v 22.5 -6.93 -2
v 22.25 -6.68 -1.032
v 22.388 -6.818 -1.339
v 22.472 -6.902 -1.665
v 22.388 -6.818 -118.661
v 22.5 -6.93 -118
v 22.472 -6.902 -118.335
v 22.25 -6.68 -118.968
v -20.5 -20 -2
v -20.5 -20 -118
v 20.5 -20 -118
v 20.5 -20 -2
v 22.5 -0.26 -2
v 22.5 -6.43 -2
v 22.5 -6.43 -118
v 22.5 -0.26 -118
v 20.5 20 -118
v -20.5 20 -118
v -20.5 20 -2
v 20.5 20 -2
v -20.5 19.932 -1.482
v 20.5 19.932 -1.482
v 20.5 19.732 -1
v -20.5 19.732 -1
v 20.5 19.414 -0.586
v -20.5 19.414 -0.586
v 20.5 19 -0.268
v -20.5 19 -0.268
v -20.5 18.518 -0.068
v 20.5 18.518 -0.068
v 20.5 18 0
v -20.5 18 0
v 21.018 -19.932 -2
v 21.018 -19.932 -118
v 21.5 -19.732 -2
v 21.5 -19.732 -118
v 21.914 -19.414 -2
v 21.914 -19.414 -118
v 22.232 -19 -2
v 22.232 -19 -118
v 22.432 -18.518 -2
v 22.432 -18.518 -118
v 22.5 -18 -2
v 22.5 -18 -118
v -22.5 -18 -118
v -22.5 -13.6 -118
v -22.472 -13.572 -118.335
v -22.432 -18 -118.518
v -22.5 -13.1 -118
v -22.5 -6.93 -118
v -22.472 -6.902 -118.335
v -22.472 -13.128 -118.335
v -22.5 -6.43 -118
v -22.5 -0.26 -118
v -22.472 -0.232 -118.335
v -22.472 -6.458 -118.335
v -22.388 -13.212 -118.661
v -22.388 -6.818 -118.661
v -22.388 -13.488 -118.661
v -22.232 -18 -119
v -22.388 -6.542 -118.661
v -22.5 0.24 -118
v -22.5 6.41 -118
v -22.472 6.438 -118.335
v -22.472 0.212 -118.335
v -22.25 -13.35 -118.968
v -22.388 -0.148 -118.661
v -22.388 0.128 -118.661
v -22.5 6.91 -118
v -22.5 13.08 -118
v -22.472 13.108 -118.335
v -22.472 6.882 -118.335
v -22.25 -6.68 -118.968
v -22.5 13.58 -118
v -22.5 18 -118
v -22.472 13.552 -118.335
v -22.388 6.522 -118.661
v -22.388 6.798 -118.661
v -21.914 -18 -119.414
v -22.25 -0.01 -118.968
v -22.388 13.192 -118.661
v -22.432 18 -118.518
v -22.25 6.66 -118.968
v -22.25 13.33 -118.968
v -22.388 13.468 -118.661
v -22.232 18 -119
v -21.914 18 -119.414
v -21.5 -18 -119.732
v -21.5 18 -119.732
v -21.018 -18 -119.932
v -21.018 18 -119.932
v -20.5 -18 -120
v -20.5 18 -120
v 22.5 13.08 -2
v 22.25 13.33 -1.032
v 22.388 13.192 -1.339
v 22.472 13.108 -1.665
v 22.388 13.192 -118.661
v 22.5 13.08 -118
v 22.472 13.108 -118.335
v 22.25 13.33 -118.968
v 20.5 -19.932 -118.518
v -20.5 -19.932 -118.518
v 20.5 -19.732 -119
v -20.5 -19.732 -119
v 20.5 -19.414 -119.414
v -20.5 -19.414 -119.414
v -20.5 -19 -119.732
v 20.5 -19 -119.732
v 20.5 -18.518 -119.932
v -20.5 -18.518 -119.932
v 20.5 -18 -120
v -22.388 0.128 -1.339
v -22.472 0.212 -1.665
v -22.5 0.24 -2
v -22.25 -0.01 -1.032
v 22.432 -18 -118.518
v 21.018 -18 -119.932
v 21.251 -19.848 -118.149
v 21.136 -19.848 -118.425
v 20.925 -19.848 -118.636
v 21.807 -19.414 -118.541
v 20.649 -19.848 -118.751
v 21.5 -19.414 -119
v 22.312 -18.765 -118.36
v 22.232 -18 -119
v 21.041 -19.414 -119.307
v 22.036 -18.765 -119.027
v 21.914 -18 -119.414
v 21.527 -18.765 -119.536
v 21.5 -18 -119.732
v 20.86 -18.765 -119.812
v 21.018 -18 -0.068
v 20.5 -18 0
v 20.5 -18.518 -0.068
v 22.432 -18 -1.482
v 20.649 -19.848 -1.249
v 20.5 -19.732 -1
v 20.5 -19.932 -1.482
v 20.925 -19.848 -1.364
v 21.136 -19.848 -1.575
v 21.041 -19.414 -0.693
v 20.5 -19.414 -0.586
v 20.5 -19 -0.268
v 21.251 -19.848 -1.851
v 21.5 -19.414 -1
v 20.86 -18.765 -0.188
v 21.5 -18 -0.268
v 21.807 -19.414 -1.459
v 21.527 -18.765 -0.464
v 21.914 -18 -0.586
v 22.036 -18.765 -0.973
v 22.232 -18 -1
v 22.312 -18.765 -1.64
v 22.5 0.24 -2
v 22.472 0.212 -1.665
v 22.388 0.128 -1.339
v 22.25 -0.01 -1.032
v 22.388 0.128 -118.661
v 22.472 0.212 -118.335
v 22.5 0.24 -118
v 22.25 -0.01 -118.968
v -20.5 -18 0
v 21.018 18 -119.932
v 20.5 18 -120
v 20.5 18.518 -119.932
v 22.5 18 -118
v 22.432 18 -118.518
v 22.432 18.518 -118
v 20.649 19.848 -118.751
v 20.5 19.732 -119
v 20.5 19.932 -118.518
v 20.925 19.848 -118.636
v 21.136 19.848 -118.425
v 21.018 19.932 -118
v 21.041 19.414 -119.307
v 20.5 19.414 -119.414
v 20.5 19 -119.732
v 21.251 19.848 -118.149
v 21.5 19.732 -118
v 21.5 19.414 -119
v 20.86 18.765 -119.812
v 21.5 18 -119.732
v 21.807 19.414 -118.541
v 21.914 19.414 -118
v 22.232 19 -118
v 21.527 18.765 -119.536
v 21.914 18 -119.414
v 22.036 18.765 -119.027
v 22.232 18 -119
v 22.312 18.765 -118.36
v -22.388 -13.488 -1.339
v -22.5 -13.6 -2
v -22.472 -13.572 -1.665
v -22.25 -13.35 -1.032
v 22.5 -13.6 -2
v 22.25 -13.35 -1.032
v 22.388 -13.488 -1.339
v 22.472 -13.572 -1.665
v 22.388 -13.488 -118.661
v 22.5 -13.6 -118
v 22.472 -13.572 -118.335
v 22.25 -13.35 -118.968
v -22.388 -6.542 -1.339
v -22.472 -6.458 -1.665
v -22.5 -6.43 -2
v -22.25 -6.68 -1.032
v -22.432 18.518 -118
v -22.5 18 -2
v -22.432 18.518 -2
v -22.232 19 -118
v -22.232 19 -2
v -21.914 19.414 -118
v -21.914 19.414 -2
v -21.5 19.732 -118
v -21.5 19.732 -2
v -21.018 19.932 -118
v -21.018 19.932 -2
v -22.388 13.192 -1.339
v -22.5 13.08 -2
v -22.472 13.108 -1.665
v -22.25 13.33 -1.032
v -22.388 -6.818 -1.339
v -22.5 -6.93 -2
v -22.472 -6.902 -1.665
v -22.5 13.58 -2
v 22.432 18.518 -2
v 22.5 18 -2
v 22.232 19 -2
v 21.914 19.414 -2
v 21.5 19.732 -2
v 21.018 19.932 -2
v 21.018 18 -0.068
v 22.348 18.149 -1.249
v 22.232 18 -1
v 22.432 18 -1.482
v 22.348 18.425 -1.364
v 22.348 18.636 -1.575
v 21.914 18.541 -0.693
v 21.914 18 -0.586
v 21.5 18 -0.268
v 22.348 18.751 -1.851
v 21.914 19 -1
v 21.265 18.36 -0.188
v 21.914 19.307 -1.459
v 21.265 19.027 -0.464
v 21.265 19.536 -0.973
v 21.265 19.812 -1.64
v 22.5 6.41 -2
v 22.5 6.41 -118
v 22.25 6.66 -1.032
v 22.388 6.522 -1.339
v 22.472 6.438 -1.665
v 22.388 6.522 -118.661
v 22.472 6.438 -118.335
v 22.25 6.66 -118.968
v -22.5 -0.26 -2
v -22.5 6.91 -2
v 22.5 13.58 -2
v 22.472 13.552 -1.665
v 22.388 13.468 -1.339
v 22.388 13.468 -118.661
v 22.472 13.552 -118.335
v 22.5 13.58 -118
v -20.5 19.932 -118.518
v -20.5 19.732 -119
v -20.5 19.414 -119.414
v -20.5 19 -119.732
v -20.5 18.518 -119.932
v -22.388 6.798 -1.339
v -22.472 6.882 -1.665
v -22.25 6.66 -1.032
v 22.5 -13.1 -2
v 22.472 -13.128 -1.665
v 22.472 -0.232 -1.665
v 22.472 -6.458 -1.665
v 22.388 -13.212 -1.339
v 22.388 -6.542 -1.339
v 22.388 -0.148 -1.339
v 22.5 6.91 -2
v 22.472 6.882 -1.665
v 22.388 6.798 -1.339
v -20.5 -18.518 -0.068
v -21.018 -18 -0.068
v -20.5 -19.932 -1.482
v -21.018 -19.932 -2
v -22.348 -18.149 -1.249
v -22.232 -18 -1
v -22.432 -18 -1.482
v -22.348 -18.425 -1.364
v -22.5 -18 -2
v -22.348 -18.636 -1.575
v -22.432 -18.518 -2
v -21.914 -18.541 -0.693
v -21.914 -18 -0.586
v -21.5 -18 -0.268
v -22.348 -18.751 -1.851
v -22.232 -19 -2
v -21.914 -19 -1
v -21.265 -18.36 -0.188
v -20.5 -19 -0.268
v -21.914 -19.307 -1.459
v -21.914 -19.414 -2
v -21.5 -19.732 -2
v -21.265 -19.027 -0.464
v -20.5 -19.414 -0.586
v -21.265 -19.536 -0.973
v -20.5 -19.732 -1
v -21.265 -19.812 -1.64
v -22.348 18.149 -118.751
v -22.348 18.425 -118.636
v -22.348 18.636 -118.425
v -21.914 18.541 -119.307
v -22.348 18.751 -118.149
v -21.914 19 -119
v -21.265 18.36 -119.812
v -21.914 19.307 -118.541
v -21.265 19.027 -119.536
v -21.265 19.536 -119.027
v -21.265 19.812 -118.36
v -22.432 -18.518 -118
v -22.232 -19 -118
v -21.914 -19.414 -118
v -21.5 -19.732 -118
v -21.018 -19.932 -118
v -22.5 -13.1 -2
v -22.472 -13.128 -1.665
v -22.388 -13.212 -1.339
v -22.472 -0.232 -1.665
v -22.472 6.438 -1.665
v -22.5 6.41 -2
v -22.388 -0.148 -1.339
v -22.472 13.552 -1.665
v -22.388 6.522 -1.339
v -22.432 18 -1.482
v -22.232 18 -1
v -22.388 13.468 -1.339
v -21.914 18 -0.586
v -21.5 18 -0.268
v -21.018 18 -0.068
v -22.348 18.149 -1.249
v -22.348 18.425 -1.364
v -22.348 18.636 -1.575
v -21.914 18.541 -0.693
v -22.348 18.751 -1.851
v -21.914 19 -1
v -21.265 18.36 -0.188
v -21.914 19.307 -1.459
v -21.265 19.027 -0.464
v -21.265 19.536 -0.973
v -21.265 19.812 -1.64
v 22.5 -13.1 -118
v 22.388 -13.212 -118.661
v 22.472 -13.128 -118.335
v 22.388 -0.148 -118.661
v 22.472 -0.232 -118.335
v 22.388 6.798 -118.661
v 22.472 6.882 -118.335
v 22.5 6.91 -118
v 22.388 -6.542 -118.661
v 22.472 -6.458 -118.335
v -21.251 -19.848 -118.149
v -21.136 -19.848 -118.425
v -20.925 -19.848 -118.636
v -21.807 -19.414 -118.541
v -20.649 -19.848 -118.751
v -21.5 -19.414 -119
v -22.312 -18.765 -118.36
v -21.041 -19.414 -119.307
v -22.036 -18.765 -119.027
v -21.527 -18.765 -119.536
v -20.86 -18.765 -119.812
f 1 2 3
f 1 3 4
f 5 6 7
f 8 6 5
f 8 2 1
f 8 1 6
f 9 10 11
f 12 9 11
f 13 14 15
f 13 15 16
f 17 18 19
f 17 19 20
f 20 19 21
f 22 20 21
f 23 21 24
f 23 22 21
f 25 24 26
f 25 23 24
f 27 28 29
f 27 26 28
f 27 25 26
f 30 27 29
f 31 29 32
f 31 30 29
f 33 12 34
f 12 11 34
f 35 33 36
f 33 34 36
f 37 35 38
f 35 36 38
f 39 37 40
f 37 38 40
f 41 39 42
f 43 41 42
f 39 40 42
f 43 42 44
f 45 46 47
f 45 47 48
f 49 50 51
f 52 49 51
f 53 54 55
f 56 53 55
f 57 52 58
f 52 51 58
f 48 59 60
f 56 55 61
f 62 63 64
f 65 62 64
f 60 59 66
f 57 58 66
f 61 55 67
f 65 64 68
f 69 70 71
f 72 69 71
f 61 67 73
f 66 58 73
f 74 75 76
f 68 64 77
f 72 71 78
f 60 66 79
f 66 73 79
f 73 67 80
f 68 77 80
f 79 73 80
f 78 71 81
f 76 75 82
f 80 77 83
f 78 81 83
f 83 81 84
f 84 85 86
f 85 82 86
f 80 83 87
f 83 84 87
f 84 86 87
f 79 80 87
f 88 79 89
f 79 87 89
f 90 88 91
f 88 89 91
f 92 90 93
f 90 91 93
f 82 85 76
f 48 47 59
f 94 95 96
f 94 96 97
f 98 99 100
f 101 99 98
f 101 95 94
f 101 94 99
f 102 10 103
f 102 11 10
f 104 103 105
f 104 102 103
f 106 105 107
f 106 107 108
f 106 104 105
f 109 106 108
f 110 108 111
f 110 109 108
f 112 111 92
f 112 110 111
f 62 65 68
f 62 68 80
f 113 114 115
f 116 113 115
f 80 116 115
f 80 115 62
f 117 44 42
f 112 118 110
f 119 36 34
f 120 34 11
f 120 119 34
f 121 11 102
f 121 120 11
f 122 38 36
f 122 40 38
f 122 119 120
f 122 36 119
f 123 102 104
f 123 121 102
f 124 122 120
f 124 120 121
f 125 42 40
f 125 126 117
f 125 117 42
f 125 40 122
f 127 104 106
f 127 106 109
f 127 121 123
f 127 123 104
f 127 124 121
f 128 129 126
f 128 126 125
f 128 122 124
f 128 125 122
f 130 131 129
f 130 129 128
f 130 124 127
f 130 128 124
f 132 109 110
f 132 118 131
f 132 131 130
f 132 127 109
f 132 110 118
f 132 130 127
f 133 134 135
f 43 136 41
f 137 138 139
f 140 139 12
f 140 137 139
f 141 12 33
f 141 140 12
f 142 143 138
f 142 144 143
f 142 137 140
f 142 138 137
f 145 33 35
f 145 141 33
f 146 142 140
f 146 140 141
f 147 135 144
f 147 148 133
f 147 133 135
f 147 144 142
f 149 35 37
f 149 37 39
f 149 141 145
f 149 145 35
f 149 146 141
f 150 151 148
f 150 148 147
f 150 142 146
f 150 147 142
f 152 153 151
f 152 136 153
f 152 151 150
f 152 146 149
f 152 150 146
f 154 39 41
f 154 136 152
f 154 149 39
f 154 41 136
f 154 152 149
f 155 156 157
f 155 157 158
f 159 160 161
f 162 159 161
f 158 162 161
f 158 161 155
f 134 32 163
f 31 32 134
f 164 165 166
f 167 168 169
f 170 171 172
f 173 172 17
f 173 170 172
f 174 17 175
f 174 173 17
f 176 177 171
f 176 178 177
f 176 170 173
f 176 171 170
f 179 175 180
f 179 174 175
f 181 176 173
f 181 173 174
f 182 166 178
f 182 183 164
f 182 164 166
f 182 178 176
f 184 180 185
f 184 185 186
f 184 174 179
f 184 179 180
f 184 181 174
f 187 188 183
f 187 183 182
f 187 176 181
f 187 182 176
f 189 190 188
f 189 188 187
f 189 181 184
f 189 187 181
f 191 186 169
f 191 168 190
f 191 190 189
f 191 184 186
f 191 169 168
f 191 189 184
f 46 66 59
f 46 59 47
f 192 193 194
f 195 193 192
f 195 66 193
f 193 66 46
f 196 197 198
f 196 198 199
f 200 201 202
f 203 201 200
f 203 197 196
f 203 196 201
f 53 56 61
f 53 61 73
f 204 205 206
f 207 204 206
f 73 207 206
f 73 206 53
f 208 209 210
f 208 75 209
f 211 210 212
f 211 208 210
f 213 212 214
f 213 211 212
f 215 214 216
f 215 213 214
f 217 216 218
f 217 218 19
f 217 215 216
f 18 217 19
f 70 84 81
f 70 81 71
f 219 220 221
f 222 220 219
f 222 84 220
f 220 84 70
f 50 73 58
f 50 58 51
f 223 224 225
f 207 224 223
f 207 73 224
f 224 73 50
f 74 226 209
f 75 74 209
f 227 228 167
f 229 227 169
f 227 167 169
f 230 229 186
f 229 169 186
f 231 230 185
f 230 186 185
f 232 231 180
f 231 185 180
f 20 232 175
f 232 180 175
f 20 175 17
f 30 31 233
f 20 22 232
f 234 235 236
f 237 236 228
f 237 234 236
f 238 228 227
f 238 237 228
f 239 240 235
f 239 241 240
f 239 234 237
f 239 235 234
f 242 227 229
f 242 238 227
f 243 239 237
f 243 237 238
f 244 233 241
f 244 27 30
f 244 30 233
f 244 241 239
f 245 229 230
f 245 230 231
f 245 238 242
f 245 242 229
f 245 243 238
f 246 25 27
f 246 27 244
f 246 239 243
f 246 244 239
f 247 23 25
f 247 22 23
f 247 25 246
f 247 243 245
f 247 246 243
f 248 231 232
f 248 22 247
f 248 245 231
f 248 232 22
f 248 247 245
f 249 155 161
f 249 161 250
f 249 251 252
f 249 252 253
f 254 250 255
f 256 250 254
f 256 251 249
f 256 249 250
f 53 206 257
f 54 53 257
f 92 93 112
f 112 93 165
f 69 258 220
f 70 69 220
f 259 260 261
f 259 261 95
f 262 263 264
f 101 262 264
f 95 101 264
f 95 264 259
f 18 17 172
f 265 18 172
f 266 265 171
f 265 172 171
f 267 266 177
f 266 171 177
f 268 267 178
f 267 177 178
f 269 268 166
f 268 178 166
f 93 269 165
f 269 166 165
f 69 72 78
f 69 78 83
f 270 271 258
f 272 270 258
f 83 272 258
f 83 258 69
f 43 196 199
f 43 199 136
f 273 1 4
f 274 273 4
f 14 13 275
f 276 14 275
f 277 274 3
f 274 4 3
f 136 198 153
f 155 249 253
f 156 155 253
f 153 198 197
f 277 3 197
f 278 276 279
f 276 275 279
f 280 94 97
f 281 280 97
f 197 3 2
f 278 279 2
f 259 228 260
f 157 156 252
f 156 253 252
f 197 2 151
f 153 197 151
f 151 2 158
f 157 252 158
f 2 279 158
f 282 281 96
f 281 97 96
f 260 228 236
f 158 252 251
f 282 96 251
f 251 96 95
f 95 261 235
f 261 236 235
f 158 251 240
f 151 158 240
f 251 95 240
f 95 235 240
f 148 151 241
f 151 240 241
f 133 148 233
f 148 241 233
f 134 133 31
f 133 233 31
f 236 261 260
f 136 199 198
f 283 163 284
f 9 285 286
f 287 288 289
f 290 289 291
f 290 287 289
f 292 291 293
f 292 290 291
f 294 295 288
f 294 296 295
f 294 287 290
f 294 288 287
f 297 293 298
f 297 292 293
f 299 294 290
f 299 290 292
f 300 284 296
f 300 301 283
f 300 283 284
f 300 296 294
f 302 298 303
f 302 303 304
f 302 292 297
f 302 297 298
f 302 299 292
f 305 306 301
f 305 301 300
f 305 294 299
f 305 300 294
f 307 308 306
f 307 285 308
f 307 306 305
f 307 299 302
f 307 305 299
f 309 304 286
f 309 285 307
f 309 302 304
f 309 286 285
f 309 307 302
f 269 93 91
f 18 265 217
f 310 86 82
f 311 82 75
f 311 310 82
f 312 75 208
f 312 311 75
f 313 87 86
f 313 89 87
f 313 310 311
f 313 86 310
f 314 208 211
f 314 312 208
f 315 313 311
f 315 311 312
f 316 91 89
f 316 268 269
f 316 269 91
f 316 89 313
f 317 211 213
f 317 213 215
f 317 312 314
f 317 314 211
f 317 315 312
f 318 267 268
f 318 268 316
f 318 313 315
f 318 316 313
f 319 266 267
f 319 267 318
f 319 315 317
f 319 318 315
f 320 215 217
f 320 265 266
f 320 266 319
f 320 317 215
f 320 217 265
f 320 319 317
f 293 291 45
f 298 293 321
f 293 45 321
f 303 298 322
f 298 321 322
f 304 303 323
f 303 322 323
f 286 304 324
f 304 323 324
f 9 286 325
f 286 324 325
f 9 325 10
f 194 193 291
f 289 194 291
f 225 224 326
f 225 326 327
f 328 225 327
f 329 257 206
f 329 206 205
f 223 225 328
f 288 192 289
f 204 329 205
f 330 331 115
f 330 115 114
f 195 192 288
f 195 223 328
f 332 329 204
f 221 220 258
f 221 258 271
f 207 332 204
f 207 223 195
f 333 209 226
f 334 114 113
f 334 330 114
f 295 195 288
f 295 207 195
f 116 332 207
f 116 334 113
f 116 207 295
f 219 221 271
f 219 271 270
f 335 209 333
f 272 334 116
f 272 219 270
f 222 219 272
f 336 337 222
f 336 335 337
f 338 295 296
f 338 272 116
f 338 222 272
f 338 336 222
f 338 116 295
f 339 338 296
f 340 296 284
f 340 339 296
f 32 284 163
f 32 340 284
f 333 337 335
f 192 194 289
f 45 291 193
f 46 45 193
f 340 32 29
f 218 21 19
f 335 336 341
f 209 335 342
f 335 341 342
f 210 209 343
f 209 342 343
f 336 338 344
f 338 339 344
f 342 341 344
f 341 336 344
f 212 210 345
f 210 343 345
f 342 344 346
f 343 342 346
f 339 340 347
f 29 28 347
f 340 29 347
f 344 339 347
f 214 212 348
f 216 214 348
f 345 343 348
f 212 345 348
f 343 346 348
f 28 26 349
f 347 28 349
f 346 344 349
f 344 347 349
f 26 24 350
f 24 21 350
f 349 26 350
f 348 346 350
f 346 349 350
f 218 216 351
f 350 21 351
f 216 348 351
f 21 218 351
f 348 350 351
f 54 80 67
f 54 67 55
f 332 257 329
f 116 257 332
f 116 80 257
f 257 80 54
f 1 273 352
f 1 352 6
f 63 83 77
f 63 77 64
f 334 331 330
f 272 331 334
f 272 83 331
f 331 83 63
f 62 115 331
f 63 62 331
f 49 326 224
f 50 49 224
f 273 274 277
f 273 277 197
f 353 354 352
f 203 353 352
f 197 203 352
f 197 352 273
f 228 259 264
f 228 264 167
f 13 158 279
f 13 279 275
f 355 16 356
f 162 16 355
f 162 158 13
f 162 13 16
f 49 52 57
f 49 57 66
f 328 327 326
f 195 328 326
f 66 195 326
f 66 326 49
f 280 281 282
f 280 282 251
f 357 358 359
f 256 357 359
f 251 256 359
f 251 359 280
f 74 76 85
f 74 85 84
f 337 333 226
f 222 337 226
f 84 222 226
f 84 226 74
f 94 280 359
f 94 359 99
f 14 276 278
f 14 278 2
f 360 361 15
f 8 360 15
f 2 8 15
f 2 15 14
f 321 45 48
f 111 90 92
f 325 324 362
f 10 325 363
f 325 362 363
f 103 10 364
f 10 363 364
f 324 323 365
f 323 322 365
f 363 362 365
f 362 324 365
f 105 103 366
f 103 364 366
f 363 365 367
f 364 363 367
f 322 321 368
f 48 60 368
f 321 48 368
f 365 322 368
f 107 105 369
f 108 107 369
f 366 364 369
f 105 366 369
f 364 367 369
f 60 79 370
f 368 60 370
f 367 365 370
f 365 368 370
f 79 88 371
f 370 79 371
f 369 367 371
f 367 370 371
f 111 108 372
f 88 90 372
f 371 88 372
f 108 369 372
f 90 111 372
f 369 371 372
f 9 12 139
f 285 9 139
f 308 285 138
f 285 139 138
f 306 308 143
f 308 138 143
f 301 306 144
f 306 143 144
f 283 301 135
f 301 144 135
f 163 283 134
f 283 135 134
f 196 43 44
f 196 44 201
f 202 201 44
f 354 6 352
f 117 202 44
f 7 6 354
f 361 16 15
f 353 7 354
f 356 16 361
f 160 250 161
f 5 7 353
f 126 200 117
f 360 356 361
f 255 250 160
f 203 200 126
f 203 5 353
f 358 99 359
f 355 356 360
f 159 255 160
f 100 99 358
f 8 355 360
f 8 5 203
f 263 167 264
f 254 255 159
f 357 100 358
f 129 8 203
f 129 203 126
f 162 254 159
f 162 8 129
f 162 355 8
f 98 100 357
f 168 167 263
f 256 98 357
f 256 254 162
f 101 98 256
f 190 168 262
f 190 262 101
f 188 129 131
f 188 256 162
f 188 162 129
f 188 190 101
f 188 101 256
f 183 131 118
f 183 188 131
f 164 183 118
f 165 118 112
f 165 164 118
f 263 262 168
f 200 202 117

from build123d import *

# Parameters (mm, degrees)
SKETCH1_W           = 45
SKETCH1_H           = 40
BOSS_EXTRUDE1_DEPTH = 120
FILLET1_R           = 2
CUT_EXTRUDE1_DEPTH  = 124.718430317
LPATTERN1_COUNT     = 5
LPATTERN1_PITCH     = 6.67


with BuildPart() as part:
    # Sketch1 → Boss-Extrude1 (new body)
    with BuildSketch(Plane.XY):
        Rectangle(SKETCH1_W, SKETCH1_H)
    extrude(amount=-BOSS_EXTRUDE1_DEPTH)

    # Fillet1
    fillet1_edges = [part.edges().sort_by_distance(p)[0] for p in [
        (22.5, 0, -120),
        (0, 20, -120),
        (-22.5, 0, -120),
        (0, 20, 0),
        (22.5, 0, 0),
        (0, -20, 0),
        (-22.5, 0, 0),
        (-22.5, 20, -60),
        (22.5, 20, -60),
        (22.5, -20, -60),
        (-22.5, -20, -60),
        (0, -20, -120),
    ]]
    fillet(fillet1_edges, radius=FILLET1_R)

    # Sketch2 → Cut-Extrude1 (cut, symmetric)
    with BuildSketch(Plane.XY):
        Polygon((22.5, 13.58), (22.25, 13.33), (22.5, 13.08), align=None)
        Polygon((-22.5, 13.58), (-22.25, 13.33), (-22.5, 13.08), align=None)
    cut_extrude1 = extrude(amount=CUT_EXTRUDE1_DEPTH, both=True, mode=Mode.SUBTRACT)

    # LPattern1: Cut-Extrude1 ×5
    with Locations(*[(0, -i * LPATTERN1_PITCH, 0) for i in range(1, LPATTERN1_COUNT)]):
        add(cut_extrude1, mode=Mode.SUBTRACT)


solid = part.part
